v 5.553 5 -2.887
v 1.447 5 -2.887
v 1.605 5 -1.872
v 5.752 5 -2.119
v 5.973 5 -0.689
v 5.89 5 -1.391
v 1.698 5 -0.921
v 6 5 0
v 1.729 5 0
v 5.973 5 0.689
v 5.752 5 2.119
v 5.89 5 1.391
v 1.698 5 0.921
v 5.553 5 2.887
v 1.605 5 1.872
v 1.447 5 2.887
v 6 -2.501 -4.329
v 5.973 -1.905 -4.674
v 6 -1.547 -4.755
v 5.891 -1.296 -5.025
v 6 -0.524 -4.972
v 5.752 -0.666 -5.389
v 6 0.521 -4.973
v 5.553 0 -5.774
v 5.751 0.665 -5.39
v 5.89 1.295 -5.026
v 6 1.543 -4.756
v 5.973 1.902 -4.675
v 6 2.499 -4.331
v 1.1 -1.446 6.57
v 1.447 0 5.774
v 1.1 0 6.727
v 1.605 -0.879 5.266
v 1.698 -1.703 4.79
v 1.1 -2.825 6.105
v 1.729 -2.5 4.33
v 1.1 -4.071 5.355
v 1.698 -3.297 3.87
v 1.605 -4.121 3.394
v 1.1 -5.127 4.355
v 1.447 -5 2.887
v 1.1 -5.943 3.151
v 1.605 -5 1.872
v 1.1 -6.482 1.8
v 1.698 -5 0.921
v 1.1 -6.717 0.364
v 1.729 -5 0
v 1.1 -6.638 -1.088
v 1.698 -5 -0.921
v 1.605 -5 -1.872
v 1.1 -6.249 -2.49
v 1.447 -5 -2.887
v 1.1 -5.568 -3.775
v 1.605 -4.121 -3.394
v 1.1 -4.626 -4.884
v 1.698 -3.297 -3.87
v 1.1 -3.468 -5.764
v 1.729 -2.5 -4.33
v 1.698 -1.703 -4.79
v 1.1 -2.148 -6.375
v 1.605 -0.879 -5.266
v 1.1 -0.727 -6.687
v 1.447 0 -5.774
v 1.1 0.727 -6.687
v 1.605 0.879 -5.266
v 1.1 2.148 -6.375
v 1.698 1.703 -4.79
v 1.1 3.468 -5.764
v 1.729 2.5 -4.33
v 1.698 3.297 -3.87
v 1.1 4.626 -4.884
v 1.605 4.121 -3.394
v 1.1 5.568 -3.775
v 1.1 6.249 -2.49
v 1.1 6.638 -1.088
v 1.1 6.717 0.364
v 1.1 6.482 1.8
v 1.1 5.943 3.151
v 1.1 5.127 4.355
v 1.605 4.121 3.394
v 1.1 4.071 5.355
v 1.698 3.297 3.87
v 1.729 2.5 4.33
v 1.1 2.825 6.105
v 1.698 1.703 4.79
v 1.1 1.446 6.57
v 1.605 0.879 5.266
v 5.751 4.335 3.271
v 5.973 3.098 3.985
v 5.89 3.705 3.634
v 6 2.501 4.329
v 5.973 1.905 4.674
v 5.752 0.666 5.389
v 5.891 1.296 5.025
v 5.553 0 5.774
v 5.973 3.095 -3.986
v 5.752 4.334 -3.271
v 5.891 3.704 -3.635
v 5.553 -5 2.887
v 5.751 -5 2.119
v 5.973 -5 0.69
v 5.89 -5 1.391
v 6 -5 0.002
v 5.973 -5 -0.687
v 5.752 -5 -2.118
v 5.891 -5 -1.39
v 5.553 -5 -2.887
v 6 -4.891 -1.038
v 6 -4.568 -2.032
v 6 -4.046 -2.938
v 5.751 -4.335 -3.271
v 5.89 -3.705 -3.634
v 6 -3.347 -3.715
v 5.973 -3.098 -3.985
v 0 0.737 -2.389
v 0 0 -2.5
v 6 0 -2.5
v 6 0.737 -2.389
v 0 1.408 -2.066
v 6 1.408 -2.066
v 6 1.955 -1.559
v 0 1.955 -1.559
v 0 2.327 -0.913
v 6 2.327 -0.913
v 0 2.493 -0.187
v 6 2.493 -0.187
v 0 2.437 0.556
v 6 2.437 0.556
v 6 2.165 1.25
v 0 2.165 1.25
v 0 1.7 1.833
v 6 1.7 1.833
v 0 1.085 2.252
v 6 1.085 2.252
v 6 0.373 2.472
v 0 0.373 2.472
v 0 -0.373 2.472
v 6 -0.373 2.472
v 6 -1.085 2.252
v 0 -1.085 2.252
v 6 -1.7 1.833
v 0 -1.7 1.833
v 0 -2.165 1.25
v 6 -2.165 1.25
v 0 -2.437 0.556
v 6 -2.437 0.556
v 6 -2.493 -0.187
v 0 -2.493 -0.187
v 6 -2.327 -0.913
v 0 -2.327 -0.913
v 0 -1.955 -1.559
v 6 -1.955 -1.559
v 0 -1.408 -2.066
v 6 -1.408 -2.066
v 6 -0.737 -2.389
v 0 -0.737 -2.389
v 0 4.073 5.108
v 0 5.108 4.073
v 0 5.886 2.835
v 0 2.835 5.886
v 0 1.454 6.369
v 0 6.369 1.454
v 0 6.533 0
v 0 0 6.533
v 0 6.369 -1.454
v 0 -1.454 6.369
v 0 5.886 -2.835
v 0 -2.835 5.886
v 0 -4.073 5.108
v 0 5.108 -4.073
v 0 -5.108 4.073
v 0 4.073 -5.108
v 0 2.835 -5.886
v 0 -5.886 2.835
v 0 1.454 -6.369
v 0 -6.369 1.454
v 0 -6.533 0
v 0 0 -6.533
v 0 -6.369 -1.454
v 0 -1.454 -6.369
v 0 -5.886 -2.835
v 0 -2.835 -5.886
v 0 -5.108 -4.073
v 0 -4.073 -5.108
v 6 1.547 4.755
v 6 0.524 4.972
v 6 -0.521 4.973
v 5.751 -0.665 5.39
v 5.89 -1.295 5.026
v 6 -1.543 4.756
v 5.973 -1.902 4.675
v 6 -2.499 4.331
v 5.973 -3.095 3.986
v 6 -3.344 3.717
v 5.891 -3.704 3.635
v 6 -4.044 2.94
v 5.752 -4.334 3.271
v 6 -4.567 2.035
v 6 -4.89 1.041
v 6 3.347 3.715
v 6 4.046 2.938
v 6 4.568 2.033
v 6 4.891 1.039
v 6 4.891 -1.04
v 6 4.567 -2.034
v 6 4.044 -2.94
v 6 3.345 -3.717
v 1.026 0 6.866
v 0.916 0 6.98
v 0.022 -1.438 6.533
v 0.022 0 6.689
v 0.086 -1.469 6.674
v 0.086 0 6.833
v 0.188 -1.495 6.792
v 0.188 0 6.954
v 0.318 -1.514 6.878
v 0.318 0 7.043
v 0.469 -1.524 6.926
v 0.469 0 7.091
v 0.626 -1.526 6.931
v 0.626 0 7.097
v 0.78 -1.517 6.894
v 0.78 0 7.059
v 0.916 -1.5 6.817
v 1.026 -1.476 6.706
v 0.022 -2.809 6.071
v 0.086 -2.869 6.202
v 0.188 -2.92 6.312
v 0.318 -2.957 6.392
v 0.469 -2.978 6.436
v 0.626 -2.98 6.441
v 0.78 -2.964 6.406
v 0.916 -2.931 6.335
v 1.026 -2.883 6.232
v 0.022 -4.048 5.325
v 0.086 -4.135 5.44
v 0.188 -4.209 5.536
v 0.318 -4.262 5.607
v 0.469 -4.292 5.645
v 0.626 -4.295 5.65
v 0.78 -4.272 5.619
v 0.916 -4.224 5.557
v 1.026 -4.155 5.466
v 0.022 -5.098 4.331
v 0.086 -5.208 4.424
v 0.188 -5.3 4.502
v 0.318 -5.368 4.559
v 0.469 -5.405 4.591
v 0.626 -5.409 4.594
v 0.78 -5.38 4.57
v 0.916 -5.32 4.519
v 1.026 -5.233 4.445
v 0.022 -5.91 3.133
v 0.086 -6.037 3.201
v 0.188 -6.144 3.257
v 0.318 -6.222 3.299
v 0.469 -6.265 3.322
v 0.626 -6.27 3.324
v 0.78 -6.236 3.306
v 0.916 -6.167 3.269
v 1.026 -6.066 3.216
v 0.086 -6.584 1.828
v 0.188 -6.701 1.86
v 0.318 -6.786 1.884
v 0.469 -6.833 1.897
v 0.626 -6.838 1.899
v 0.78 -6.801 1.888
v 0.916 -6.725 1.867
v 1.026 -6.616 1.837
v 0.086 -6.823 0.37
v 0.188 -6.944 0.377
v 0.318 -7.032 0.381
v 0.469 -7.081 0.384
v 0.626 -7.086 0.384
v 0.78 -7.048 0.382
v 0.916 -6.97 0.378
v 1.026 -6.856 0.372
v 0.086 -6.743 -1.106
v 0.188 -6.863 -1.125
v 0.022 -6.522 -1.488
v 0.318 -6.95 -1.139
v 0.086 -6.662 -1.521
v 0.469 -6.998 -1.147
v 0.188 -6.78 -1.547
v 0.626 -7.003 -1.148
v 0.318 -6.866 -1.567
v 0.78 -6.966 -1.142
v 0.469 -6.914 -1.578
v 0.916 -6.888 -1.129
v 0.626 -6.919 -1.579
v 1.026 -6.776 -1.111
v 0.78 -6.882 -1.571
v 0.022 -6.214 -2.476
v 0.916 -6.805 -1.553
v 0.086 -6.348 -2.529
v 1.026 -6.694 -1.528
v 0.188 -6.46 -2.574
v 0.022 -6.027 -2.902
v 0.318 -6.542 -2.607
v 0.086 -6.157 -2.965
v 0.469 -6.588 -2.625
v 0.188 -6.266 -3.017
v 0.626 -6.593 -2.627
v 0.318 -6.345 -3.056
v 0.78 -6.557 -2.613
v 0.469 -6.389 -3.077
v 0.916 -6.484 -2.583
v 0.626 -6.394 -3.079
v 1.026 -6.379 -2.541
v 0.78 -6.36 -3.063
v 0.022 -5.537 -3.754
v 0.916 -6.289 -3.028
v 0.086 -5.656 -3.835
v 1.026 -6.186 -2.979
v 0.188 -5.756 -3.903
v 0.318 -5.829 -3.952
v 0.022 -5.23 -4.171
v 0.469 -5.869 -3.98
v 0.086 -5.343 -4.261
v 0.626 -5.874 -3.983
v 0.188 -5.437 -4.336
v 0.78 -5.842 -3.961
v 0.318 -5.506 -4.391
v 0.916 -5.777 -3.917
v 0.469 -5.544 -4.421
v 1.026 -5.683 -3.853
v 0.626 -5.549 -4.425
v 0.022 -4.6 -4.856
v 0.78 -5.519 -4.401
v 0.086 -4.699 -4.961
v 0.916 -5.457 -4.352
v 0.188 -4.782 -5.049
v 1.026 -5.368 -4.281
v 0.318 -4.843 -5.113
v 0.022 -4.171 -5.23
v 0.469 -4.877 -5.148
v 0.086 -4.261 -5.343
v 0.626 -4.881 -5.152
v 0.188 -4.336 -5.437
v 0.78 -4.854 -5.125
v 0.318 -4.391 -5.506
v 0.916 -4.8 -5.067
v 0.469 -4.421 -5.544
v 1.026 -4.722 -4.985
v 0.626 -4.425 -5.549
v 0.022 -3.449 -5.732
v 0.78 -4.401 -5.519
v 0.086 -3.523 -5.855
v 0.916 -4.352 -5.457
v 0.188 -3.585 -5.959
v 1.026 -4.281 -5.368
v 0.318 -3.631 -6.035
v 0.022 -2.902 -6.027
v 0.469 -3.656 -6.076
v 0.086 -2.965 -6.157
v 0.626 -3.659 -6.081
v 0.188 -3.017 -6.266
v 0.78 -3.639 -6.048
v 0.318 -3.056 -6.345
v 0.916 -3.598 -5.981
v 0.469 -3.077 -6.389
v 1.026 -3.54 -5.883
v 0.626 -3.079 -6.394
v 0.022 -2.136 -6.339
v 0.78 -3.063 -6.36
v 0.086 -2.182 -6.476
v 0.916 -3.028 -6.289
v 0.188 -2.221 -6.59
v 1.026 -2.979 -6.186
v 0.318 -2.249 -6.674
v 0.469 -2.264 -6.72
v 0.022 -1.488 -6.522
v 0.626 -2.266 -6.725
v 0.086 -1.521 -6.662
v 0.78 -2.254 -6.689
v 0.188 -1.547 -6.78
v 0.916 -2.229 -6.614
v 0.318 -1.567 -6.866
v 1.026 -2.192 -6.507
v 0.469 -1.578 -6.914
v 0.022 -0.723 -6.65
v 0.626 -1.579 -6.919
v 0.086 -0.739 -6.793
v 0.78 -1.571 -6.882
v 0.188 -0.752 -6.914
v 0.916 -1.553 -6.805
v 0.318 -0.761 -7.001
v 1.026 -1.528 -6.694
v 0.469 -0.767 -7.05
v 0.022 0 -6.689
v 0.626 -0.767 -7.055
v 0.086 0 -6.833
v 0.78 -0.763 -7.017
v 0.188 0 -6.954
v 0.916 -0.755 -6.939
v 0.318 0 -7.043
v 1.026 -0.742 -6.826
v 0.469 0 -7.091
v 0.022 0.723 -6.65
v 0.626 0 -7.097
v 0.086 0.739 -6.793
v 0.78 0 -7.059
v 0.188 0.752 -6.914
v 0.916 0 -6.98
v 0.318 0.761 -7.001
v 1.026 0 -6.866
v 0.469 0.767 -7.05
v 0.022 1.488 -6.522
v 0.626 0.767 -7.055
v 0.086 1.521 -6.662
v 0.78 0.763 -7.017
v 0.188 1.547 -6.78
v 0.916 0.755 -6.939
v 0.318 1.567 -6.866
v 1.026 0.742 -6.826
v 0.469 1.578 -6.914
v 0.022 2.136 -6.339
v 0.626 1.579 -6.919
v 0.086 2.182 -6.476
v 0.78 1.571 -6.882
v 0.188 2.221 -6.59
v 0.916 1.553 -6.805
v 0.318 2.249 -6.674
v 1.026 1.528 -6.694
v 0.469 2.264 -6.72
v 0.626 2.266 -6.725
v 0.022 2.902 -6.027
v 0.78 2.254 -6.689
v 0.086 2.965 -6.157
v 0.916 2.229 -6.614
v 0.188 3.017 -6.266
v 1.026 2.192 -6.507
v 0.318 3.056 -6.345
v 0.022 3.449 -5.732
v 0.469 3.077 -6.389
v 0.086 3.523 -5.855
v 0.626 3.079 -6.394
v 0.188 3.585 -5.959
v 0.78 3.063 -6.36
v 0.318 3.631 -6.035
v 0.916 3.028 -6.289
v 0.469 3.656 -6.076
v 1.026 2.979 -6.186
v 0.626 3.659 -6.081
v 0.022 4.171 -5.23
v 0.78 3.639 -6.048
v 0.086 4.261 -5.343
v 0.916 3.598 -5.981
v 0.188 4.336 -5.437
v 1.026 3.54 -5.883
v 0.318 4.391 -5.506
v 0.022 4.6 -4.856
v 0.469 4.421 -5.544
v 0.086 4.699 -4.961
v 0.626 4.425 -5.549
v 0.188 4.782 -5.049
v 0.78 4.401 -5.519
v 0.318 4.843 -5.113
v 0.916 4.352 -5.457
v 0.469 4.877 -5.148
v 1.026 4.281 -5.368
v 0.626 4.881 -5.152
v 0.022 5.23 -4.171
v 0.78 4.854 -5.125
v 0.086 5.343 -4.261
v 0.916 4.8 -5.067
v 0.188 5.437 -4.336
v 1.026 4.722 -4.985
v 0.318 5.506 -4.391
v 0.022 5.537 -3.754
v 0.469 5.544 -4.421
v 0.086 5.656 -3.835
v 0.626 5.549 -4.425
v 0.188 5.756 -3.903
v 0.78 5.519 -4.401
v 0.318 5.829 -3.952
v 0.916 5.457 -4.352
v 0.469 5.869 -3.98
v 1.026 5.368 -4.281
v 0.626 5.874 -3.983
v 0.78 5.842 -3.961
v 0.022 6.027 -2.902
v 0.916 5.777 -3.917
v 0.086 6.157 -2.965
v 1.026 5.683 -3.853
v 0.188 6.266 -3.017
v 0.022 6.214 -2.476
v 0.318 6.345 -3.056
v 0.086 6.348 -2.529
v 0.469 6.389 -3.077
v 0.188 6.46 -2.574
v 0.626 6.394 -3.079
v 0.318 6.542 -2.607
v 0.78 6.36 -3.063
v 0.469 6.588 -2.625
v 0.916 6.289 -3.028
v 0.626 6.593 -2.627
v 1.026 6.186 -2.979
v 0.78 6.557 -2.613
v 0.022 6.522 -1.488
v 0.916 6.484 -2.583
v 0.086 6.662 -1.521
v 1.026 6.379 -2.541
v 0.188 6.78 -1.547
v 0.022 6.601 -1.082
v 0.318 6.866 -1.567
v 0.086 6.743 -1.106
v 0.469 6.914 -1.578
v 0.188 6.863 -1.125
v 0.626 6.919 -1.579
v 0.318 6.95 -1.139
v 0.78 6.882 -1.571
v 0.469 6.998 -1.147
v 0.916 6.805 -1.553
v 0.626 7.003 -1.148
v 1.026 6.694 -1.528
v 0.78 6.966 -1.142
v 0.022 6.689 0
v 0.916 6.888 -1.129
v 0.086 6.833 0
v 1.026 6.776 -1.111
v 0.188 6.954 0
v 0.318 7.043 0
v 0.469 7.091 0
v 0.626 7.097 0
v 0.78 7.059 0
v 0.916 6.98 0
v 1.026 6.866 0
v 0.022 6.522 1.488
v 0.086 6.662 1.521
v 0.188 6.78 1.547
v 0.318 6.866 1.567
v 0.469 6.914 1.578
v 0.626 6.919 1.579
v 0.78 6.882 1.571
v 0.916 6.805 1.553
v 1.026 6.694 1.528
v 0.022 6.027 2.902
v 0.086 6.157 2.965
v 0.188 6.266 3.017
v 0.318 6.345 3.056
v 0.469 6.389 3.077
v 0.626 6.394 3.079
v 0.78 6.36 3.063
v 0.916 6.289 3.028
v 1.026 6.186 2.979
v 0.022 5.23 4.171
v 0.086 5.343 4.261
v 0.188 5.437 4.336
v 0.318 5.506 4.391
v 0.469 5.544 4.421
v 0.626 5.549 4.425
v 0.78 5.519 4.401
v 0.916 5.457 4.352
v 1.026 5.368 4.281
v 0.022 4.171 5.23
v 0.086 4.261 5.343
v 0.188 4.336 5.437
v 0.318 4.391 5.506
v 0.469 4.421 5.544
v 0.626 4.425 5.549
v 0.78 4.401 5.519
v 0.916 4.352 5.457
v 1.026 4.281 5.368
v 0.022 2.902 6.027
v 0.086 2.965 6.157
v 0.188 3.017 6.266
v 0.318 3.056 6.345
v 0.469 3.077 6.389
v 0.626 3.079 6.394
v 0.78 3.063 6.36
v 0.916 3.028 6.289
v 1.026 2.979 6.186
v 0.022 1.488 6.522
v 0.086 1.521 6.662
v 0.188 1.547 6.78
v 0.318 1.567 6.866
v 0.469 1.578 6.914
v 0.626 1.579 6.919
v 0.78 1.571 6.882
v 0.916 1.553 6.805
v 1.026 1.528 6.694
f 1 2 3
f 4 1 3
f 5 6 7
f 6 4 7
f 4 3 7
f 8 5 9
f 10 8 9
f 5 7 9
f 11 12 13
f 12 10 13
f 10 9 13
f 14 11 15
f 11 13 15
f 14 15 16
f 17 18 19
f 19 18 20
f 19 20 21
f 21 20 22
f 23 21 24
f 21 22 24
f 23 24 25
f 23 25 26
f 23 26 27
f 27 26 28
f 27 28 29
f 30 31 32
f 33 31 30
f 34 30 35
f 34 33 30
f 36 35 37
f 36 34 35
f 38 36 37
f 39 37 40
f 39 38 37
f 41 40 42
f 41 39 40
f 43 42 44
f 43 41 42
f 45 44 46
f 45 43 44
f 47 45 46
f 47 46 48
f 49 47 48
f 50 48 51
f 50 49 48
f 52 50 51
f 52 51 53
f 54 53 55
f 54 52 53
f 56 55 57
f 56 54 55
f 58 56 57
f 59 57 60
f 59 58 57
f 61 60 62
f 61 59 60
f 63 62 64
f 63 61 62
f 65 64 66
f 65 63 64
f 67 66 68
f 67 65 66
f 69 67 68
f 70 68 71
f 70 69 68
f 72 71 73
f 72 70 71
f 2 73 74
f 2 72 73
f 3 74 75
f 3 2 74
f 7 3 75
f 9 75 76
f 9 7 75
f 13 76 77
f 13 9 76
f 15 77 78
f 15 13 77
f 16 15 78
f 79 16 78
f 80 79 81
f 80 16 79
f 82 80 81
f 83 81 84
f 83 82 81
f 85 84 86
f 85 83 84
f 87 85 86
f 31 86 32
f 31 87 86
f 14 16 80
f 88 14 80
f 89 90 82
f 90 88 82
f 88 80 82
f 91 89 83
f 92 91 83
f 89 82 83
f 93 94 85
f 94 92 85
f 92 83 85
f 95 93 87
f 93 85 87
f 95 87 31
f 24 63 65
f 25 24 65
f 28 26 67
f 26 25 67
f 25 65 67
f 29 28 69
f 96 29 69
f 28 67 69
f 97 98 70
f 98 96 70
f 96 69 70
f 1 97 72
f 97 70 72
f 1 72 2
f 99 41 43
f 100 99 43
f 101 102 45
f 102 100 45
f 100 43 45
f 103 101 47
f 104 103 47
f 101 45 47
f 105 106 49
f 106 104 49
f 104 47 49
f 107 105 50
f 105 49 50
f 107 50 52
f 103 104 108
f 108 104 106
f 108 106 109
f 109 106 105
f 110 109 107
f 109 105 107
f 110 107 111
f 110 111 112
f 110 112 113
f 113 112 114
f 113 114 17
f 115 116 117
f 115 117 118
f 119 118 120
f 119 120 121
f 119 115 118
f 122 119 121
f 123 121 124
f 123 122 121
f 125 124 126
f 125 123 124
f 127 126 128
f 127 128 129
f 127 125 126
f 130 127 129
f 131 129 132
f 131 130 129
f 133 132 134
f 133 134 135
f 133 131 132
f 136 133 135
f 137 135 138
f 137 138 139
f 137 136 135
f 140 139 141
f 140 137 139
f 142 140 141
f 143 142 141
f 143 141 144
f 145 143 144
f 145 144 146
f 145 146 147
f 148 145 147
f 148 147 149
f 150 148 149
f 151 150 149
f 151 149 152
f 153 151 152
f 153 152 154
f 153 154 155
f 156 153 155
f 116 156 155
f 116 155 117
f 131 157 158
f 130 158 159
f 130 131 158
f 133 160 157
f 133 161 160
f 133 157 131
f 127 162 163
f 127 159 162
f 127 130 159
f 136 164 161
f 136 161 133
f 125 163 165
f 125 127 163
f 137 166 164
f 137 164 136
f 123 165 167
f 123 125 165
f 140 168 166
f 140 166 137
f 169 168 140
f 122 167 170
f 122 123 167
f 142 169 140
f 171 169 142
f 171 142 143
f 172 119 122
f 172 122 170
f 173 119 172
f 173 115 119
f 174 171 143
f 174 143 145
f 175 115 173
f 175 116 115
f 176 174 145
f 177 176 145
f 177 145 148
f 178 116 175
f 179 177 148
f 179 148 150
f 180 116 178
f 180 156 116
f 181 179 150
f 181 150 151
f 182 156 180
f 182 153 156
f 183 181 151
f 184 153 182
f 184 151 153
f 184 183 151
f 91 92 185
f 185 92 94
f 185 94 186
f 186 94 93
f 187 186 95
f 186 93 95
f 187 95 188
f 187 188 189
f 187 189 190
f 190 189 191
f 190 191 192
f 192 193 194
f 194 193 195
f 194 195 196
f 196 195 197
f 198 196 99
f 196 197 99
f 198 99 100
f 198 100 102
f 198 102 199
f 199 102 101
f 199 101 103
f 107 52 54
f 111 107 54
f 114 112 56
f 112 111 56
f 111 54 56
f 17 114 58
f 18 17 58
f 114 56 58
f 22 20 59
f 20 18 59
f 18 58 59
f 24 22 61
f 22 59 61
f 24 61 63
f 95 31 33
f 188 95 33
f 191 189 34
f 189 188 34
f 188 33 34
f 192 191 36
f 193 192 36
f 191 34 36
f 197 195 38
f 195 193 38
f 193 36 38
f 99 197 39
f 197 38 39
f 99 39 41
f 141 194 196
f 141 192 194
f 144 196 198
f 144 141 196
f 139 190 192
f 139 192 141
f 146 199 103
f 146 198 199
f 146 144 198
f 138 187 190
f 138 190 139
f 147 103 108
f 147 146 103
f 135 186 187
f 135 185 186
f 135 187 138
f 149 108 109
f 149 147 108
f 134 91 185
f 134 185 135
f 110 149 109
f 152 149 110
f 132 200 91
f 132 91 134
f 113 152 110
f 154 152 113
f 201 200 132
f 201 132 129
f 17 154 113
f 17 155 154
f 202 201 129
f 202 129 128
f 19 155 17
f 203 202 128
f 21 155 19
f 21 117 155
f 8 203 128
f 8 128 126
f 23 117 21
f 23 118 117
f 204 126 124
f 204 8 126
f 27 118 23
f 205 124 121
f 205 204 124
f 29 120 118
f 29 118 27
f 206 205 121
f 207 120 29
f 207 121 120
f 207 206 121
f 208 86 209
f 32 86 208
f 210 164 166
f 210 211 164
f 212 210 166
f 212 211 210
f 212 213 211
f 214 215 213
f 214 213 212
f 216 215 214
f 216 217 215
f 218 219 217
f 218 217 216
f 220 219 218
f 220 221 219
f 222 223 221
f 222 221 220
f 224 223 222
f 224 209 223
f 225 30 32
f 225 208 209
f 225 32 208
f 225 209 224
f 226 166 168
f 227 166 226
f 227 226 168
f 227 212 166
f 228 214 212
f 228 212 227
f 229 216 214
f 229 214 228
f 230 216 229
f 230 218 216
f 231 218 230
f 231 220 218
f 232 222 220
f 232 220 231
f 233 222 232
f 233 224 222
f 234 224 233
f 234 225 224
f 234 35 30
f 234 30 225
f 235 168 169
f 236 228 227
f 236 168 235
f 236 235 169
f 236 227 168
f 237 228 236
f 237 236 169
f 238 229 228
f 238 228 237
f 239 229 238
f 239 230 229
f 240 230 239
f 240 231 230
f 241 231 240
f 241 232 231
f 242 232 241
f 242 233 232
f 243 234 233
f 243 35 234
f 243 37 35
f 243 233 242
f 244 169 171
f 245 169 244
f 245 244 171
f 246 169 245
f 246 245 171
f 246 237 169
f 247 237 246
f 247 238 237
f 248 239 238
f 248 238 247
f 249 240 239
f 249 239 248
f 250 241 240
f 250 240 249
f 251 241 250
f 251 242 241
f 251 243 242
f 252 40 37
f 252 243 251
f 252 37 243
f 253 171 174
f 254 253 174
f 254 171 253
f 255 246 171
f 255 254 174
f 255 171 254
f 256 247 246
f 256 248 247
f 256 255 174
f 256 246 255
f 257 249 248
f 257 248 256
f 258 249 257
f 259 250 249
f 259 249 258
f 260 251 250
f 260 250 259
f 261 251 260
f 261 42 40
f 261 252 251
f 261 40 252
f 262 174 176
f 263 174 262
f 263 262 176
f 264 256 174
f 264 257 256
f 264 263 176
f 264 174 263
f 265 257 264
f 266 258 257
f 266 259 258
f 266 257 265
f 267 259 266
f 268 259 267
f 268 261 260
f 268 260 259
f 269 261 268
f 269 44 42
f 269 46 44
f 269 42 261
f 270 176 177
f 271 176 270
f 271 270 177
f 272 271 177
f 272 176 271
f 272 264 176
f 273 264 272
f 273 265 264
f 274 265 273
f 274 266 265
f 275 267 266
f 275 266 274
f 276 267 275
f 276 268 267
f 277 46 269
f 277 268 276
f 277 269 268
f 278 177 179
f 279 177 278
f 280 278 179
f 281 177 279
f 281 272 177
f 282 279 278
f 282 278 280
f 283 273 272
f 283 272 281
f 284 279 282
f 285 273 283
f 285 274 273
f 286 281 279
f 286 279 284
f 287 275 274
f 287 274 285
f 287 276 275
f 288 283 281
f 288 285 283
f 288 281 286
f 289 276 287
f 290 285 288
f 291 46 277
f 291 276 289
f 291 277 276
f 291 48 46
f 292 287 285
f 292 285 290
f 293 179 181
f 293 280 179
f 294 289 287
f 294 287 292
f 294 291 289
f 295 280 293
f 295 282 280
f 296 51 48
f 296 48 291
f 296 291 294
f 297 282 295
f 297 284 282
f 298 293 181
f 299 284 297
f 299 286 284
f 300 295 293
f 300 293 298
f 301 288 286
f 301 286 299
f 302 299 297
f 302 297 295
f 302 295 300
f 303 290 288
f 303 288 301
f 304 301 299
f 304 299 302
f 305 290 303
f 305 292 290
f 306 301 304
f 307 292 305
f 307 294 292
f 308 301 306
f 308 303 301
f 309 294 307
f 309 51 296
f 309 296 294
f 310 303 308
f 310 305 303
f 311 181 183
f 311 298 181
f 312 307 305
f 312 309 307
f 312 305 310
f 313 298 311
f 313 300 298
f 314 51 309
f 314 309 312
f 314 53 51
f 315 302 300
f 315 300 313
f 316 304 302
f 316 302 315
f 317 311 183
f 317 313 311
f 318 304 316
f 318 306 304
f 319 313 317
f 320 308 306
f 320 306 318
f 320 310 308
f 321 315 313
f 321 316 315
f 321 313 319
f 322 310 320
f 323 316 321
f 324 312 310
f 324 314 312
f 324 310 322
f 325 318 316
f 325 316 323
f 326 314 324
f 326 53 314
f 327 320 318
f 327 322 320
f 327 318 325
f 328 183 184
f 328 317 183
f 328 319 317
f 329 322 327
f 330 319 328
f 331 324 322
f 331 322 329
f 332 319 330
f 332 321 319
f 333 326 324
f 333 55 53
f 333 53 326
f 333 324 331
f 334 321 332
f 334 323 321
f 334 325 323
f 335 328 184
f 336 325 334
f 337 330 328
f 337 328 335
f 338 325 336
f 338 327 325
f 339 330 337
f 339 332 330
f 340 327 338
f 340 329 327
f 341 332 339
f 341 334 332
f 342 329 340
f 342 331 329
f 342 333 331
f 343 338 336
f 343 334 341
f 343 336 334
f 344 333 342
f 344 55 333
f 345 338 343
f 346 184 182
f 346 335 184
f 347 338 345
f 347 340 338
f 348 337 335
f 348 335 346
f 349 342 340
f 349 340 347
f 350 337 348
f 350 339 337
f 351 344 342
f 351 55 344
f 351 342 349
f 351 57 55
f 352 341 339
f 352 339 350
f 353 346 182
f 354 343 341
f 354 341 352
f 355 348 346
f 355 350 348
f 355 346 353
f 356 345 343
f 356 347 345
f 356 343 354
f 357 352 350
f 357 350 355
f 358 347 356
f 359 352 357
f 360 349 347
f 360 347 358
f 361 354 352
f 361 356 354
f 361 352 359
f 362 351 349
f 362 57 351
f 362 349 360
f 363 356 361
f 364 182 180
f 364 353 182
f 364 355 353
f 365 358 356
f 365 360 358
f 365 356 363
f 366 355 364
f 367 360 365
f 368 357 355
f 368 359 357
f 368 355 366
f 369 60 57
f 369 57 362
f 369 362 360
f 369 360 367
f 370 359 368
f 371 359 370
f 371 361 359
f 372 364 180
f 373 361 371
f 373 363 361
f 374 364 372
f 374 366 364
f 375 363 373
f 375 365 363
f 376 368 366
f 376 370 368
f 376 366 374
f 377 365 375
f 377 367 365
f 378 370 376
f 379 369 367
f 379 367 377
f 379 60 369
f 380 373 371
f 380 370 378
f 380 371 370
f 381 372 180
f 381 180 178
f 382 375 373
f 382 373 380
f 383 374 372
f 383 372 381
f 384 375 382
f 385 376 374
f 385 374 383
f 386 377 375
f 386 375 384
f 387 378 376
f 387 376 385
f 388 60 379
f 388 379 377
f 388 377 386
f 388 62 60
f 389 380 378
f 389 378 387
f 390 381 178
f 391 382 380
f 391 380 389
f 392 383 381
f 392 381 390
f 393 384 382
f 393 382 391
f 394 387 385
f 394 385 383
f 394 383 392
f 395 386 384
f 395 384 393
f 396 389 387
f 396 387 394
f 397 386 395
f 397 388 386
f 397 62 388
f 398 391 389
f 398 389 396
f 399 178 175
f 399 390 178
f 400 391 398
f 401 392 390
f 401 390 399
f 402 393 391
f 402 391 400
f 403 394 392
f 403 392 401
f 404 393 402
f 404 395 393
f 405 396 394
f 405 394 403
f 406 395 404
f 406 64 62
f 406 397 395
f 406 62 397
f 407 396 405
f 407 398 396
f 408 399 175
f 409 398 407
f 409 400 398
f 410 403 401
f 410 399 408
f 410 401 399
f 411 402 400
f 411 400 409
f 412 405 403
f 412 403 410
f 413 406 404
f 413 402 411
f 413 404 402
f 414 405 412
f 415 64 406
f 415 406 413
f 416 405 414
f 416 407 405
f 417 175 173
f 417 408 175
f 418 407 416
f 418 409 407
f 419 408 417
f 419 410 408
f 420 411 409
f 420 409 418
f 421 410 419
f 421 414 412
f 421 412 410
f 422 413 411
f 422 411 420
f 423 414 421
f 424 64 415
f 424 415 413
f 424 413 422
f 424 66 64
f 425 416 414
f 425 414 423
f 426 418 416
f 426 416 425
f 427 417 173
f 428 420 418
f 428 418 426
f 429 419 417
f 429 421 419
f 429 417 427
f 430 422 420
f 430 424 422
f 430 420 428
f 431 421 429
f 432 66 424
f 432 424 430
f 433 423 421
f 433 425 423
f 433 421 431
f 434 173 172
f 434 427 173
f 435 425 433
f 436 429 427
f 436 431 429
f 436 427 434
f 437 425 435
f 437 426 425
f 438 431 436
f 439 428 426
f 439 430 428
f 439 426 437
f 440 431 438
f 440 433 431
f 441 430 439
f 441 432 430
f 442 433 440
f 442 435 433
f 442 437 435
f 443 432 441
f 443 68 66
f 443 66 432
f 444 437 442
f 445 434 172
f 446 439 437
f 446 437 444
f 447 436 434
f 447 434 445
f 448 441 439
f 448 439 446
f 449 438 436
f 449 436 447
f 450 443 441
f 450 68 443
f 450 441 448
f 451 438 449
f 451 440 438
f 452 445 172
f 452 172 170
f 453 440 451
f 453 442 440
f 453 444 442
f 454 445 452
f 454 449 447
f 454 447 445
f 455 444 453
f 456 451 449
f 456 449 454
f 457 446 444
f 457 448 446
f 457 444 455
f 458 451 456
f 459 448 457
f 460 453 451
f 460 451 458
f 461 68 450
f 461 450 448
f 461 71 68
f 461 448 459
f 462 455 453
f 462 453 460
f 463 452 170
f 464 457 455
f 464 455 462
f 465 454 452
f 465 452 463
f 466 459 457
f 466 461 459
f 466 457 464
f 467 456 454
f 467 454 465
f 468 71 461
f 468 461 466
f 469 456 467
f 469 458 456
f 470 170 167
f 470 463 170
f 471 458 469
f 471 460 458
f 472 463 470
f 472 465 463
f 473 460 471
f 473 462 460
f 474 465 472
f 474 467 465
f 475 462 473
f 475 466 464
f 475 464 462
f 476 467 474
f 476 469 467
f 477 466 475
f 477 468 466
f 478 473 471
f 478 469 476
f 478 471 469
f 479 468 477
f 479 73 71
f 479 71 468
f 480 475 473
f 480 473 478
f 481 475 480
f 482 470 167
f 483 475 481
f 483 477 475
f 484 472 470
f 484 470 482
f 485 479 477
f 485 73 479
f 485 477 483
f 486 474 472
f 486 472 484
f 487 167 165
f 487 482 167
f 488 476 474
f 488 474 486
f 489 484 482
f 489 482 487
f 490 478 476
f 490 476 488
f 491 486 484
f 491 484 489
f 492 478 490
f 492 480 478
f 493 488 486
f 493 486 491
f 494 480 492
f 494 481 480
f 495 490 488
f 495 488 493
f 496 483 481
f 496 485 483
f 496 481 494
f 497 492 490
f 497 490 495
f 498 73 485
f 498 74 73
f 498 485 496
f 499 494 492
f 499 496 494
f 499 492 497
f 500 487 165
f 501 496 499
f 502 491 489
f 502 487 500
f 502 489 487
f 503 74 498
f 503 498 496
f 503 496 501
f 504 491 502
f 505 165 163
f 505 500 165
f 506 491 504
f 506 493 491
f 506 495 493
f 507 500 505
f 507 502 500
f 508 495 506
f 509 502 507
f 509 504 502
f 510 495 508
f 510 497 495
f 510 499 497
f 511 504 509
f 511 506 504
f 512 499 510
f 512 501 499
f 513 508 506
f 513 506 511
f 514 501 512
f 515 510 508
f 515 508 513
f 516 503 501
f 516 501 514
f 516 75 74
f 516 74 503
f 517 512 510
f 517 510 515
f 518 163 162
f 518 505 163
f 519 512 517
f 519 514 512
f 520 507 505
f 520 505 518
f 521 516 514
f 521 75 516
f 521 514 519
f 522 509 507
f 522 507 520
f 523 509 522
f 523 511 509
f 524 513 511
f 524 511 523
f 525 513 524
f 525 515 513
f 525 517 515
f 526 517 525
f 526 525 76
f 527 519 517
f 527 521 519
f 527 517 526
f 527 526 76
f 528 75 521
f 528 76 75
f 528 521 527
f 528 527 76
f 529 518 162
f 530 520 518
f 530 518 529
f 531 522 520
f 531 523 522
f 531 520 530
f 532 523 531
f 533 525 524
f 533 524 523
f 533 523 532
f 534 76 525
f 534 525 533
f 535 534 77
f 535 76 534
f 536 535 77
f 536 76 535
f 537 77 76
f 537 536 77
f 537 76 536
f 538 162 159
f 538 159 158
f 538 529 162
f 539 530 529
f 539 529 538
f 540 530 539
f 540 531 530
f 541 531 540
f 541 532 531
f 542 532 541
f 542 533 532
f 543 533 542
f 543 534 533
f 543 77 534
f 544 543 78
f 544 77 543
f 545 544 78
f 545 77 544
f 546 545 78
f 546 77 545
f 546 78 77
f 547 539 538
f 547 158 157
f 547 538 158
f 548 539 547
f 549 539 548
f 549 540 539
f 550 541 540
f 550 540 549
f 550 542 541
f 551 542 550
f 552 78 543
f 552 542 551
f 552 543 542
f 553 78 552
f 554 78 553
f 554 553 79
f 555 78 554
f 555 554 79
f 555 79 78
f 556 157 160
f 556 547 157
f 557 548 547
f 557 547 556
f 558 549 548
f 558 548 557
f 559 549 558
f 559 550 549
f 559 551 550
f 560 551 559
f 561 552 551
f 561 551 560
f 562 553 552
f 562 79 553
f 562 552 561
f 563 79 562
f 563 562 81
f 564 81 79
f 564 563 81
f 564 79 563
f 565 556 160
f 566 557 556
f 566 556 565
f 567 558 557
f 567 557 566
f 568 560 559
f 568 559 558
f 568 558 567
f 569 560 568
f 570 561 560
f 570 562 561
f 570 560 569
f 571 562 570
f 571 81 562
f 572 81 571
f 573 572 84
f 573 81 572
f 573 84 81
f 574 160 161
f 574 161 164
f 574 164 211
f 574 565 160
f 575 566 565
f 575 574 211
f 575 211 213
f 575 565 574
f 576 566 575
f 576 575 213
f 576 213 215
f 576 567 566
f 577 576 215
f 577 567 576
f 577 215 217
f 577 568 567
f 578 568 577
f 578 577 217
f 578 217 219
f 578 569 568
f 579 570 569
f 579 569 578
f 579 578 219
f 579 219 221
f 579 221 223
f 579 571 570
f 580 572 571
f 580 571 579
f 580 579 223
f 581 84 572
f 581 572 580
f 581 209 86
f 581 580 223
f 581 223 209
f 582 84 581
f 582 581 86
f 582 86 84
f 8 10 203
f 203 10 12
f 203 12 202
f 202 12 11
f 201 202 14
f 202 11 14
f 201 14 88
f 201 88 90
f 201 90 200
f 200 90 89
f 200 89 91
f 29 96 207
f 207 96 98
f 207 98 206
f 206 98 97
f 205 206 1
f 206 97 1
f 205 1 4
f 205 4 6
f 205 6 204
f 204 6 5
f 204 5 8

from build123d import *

# Parameters (mm, degrees)
SKETCH1_R      = 2.5
EXTRUDE1_DEPTH = 6


# Read off the part's stored shape, not the designer's step: Cut-Extrude1
with BuildPart() as part:
    # Sketch1 → Extrude1 (new body)
    with BuildSketch(Plane(origin=(0, 0, 0), x_dir=(0, 0, -1), z_dir=(1, 0, 0))):
        Polygon((5.773502692, 0), (2.886751346, 5), (-2.886751346, 5), (-5.773502692, 0), (-2.886751346, -5), (2.886751346, -5), align=None)
        Circle(SKETCH1_R, mode=Mode.SUBTRACT)
    extrude(amount=EXTRUDE1_DEPTH)

    # Cut-Extrude1 outline → Cut-Extrude1 (revolve, cut)
    with BuildSketch(Plane.YX):
        Polygon((5.773502692, 6.000000845), (4.999998834, 6.000000845), (5.773502688, 5.553418015), align=None)
    revolve(axis=Axis((0, 0, 0), (1, 0, 0)), mode=Mode.SUBTRACT)

    # Sketch3 → Revolve1 (revolve)
    with BuildSketch(Plane.XY, mode=Mode.PRIVATE) as revolve1_sk:
        with BuildLine():
            Line((0, 2.5), (0, 6.532899838))
            ThreePointArc((0, 6.532899838), (0.468624253, 7.091384474), (1.1, 6.726859517))
            Line((1.1, 6.726859517), (2.638451048, 2.5))
            Line((2.638451048, 2.5), (0, 2.5))
        make_face()
    revolve(revolve1_sk.sketch.rotate(Axis((0, 0, 0), (1, 0, 0)), 90), axis=Axis((0, 0, 0), (1, 0, 0)))


solid = part.part
